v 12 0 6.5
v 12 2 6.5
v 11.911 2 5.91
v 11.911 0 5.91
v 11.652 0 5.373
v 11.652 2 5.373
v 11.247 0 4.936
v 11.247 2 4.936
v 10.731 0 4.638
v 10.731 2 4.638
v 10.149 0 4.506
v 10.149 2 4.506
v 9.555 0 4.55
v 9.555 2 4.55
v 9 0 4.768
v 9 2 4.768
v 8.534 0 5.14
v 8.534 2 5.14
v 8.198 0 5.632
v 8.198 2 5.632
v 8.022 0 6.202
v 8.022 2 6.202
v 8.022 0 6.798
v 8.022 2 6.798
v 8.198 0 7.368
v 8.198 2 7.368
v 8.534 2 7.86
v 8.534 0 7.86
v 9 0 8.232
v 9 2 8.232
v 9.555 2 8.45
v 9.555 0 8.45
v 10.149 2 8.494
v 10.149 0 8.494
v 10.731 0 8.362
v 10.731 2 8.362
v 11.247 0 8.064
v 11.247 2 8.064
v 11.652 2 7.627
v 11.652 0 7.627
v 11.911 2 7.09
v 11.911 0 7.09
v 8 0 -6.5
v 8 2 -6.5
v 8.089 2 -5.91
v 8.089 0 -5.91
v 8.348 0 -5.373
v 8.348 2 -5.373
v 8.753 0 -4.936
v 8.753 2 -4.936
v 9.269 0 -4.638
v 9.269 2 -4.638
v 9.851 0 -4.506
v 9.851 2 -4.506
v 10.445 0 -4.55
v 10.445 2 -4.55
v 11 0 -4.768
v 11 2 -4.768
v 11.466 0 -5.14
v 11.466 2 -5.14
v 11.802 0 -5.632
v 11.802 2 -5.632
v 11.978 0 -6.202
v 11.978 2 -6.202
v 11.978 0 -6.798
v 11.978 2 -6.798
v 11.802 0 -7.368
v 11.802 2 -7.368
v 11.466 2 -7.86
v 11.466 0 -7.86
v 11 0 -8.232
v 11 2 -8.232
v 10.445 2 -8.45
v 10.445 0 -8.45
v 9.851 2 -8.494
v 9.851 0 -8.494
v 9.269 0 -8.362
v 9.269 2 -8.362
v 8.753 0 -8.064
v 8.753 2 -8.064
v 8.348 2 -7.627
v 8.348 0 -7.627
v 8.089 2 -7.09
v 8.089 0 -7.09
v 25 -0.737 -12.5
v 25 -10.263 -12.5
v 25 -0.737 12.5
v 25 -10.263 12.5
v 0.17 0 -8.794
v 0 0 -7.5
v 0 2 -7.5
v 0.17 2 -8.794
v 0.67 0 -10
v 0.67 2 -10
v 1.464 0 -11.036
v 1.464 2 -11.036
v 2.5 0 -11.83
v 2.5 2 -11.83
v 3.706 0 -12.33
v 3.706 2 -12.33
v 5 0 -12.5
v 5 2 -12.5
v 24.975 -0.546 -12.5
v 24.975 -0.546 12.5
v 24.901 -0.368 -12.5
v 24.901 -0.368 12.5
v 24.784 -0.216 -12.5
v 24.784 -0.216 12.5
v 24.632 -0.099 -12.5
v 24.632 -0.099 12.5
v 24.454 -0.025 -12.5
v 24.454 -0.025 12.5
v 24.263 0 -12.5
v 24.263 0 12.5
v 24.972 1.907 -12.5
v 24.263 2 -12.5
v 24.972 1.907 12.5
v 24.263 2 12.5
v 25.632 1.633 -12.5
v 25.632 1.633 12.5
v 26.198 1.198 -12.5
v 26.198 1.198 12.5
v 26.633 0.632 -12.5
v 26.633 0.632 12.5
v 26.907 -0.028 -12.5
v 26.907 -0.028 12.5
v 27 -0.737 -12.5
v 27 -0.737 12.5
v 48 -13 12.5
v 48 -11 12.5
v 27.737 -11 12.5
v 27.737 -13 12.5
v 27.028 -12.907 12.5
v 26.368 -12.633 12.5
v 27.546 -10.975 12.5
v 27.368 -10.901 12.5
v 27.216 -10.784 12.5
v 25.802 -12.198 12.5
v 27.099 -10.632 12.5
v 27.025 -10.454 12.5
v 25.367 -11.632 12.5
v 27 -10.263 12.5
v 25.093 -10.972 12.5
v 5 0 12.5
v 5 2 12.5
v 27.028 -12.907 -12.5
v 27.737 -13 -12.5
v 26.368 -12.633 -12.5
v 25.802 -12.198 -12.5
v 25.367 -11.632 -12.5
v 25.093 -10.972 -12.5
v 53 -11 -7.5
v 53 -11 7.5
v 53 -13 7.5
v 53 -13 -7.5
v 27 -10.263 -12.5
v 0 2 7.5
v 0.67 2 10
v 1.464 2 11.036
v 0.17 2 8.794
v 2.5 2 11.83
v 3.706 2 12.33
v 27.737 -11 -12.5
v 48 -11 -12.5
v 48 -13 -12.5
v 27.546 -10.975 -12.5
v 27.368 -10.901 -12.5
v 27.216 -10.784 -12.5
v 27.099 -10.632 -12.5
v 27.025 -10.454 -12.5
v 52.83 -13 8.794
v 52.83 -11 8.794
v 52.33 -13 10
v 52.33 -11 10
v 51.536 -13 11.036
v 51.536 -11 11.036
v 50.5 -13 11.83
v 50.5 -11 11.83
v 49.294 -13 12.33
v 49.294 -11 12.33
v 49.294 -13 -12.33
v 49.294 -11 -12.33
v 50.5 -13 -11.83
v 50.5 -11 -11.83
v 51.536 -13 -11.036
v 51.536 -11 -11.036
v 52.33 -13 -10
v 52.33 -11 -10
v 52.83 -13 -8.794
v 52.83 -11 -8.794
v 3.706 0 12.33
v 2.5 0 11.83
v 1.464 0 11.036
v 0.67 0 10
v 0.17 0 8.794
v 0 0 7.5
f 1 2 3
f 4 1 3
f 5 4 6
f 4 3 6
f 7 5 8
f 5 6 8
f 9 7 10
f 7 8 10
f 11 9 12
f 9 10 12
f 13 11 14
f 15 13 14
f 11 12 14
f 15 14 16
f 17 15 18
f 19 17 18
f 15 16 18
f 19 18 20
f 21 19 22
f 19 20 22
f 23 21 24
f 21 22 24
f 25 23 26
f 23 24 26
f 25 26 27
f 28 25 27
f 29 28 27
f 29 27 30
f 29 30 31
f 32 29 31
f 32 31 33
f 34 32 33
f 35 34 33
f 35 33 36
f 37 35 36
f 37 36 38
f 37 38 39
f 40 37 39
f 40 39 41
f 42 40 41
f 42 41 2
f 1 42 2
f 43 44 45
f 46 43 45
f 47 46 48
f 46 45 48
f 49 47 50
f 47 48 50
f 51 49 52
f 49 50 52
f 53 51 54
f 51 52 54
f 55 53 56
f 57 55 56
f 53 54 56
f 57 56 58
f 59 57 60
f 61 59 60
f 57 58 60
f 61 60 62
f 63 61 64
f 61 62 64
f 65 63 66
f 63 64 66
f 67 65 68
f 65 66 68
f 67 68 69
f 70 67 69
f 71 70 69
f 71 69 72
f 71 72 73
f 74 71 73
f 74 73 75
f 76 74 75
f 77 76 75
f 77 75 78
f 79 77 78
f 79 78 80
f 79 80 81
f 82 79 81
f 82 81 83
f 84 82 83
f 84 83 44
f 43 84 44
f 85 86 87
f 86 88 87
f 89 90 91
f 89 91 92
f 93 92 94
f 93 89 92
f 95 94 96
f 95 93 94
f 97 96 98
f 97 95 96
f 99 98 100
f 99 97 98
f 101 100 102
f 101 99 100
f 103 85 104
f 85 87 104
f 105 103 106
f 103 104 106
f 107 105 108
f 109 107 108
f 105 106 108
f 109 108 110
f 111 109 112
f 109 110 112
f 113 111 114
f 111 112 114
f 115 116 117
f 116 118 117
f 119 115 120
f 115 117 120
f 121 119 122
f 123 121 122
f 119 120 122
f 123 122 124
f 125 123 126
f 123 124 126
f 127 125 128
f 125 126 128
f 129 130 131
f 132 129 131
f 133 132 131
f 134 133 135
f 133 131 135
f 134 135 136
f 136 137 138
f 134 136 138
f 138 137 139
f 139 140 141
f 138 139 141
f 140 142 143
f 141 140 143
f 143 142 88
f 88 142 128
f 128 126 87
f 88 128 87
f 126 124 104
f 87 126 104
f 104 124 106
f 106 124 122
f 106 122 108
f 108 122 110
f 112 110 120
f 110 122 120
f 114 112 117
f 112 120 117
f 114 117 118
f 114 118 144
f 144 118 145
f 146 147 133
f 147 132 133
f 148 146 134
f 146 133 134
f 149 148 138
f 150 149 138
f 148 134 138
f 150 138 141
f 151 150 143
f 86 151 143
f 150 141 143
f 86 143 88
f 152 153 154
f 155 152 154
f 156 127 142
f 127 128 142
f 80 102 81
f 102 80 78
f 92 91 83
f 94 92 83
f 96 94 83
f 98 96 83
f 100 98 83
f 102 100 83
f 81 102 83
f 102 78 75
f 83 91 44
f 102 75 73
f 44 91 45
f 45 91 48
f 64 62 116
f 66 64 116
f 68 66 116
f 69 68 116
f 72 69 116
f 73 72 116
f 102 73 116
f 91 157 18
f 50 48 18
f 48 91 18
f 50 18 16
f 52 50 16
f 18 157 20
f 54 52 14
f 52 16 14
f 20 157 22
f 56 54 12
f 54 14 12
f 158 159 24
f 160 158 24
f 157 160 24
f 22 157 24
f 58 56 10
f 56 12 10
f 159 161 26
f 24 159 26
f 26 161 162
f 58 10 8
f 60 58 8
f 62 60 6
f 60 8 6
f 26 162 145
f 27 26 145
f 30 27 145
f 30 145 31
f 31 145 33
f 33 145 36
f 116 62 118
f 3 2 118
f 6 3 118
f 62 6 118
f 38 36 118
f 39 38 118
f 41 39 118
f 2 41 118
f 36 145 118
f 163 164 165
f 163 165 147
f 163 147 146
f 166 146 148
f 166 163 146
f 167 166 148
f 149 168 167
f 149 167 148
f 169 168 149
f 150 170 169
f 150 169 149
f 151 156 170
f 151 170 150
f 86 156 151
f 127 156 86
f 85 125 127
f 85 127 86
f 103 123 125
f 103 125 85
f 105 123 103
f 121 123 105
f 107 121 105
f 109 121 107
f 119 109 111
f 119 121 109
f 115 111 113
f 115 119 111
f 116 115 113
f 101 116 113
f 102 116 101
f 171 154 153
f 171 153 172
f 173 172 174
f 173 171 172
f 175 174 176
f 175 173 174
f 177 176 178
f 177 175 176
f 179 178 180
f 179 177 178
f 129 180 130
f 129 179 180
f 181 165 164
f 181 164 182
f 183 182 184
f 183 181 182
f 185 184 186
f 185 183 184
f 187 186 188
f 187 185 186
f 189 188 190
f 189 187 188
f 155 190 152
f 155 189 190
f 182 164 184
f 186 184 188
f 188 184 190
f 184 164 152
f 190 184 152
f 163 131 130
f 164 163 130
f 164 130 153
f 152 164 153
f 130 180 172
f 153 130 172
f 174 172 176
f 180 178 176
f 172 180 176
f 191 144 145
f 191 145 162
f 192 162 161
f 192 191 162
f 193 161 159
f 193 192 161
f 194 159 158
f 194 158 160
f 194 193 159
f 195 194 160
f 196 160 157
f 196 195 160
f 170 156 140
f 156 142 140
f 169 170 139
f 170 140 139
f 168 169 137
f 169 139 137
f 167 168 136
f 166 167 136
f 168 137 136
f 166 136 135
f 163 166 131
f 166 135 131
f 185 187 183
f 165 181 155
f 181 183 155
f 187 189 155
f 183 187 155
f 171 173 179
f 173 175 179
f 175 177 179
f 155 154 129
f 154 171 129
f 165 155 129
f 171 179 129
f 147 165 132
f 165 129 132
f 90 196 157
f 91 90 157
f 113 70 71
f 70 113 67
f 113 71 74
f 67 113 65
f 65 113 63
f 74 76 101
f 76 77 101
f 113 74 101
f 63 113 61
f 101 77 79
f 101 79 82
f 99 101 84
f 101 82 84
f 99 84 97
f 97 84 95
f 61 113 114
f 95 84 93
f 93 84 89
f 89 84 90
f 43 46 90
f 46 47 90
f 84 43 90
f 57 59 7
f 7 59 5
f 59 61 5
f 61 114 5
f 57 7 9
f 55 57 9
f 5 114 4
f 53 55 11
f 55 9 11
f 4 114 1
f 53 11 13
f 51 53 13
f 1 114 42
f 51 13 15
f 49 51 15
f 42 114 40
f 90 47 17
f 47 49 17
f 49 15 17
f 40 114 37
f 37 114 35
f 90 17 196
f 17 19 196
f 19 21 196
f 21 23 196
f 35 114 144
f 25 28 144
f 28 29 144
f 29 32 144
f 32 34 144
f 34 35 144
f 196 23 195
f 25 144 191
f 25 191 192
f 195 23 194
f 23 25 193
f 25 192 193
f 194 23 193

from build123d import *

# Parameters (mm, degrees)
TABAN_FLAN_1_DEPTH    = 12.5
K_ELERI_START         = -13
K_ELERI_K_R1_DEPTH    = 15
IZIM2_R               = 2
KES_EKSTR_ZYON1_DEPTH = 10


# Read off the part's stored shape, not the designer's step: Köşeleri kır1
# Sheet-metal steps are written as plain solids
with BuildPart() as part:
    # Çizim1 → Taban-Flanş1 (new, symmetric)
    with BuildSketch(Plane.XY):
        with BuildLine():
            Line((53, -13), (27.7366, -13))
            ThreePointArc((27.7366, -13), (25.801531583, -12.198468417), (25, -10.2634))
            Line((25, -10.2634), (25, -0.7366))
            ThreePointArc((25, -0.7366), (24.784254855, -0.215745145), (24.2634, 0))
            Line((24.2634, 0), (0, 0))
            Line((0, 0), (0, 2))
            Line((0, 2), (24.2634, 2))
            ThreePointArc((24.2634, 2), (26.198468417, 1.198468417), (27, -0.7366))
            Line((27, -0.7366), (27, -10.2634))
            ThreePointArc((27, -10.2634), (27.215745145, -10.784254855), (27.7366, -11))
            Line((27.7366, -11), (53, -11))
            Line((53, -11), (53, -13))
        make_face()
    extrude(amount=TABAN_FLAN_1_DEPTH, both=True)

    # Köşeleri kır1 outline → Köşeleri kır1 (cut)
    with BuildSketch(Plane(origin=(0, 0, 0), x_dir=(1, 0, 0), z_dir=(0, 1, 0)).offset(K_ELERI_START)):
        with BuildLine():
            Line((53, 12.5), (48, 12.5))
            ThreePointArc((48, 12.5), (51.535533906, 11.035533906), (53, 7.5))
            Line((53, 7.5), (53, 12.5))
        make_face()
        with BuildLine():
            Line((53, -12.5), (53, -7.5))
            ThreePointArc((53, -7.5), (51.535533906, -11.035533906), (48, -12.5))
            Line((48, -12.5), (53, -12.5))
        make_face()
        with BuildLine():
            ThreePointArc((5, -12.5), (1.464466094, -11.035533906), (0, -7.5))
            Line((0, -7.5), (0, -12.5))
            Line((0, -12.5), (5, -12.5))
        make_face()
        with BuildLine():
            ThreePointArc((0, 7.5), (1.464466094, 11.035533906), (5, 12.5))
            Line((5, 12.5), (0, 12.5))
            Line((0, 12.5), (0, 7.5))
        make_face()
    extrude(amount=K_ELERI_K_R1_DEPTH, mode=Mode.SUBTRACT)

    # Çizim2 → Kes-Ekstrüzyon1 (cut)
    with BuildSketch(Plane(origin=(0, 2, 0), x_dir=(1, 0, 0), z_dir=(0, 1, 0))):
        with Locations(Location((10, 6.5, 0), (0, 0, 180))):
            Circle(IZIM2_R)
        with Locations((10, -6.5)):
            Circle(IZIM2_R)
    extrude(amount=-KES_EKSTR_ZYON1_DEPTH, mode=Mode.SUBTRACT)


solid = part.part
